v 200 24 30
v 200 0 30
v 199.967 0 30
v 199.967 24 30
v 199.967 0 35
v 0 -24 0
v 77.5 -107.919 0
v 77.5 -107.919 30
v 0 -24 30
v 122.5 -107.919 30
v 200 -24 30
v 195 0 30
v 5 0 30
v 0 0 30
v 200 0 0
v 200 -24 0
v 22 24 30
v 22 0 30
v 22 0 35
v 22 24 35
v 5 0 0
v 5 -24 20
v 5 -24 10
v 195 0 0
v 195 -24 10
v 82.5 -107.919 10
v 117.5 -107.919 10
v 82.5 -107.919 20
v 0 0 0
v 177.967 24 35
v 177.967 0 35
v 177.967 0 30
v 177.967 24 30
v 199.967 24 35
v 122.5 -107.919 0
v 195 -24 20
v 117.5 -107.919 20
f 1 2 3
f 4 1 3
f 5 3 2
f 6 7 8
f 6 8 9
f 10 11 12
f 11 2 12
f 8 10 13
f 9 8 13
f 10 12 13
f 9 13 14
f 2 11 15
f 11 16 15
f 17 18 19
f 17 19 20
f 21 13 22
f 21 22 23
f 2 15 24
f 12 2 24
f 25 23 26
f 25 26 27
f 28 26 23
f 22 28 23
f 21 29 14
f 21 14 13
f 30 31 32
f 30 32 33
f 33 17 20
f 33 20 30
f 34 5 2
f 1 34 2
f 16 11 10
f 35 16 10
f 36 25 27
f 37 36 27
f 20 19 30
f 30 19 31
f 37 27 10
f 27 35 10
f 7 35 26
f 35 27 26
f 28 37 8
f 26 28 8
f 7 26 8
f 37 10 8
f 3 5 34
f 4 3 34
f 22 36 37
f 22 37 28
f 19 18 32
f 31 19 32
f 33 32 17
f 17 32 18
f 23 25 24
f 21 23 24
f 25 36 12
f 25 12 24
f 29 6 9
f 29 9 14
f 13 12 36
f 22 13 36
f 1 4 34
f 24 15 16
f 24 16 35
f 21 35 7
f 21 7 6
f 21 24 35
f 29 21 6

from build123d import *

# Parameters (mm, degrees)
SKETCH1_W               = 200
SKETCH1_H               = 24
BOSS_EXTRUDE1_DEPTH     = 30
CUT_EXTRUDE1_DEPTH      = 204.656573672
CUT_EXTRUDE1_DEPTH_BACK = 195
SKETCH3_W               = 5
SKETCH3_H               = 30
BOSS_EXTRUDE2_DEPTH     = 24
BOSS_EXTRUDE3_DEPTH     = 24
SKETCH10_W              = 22
SKETCH10_H              = 24
CUT_EXTRUDE8_DEPTH      = 24
SKETCH12_W              = 22
SKETCH12_H              = 24
CUT_EXTRUDE9_DEPTH      = 24
BOSS_EXTRUDE4_DEPTH     = 30
CUT_EXTRUDE13_DEPTH     = 20
SKETCH16_W              = 190
SKETCH16_H              = 10
BOSS_EXTRUDE5_DEPTH     = 84
CUT_EXTRUDE15_DEPTH     = 84
CUT_EXTRUDE16_DEPTH     = 84
CUT_EXTRUDE17_DEPTH     = 84


with BuildPart() as part:
    # Sketch1 → Boss-Extrude1 (new body)
    with BuildSketch(Plane.XY):
        with Locations((100, -12)):
            Rectangle(SKETCH1_W, SKETCH1_H)
    extrude(amount=BOSS_EXTRUDE1_DEPTH)

    # Sketch2 → Cut-Extrude1 (cut, two sides: drawn at the far end of the back side and taken through both)
    with BuildSketch(Plane(origin=(200, 0, 0), x_dir=(0, 0, -1), z_dir=(1, 0, 0)).offset(-CUT_EXTRUDE1_DEPTH_BACK)):
        Polygon((0, 0), (-30, 0), (-20, -24), (-10, -24), align=None)
    extrude(amount=CUT_EXTRUDE1_DEPTH + CUT_EXTRUDE1_DEPTH_BACK, mode=Mode.SUBTRACT)

    # Sketch3 → Boss-Extrude2 (add)
    with BuildSketch(Plane(origin=(0, -24, 0), x_dir=(-1, 0, 0), z_dir=(0, -1, 0))):
        with Locations((-197.5, -15)):
            Rectangle(SKETCH3_W, SKETCH3_H)
    extrude(amount=-BOSS_EXTRUDE2_DEPTH)

    # Sketch13 → Boss-Extrude4 (add)
    with BuildSketch(Plane(origin=(0, 0, 0), x_dir=(-1, 0, 0), z_dir=(0, 0, -1))):
        Polygon((-200, -24), (-122.5, -107.919158747), (-77.5, -107.919158747), (0, -24), (-100, -24), align=None)
    extrude(amount=-BOSS_EXTRUDE4_DEPTH)

    # Sketch15 → Cut-Extrude13 (cut)
    with BuildSketch(Plane(origin=(0, 0, 0), x_dir=(-1, 0, 0), z_dir=(0, 0, -1))):
        Polygon((-5, -24), (-195, -24), (-117.5, -107.919158747), (-82.5, -107.919158747), align=None)
    extrude(amount=-CUT_EXTRUDE13_DEPTH, mode=Mode.SUBTRACT)

    # Sketch16 → Boss-Extrude5 (add)
    with BuildSketch(Plane.XZ.offset(24)):
        with Locations((100, 5)):
            Rectangle(SKETCH16_W, SKETCH16_H)
    extrude(amount=BOSS_EXTRUDE5_DEPTH)

    # Sketch17 → Cut-Extrude15 (cut)
    with BuildSketch(Plane.XY.offset(10)):
        Polygon((5, -29.414139274), (77.5, -107.919158747), (77.5, -132.289911092), (5, -132.289911092), (5, -108), align=None)
    extrude(amount=-CUT_EXTRUDE15_DEPTH, mode=Mode.SUBTRACT)

    # Sketch18 → Cut-Extrude16 (cut)
    with BuildSketch(Plane.XY.offset(10)):
        Polygon((195, -29.414139274), (122.5, -107.919158747), (122.856459542, -124.209438819), (195, -124.209438819), align=None)
    extrude(amount=-CUT_EXTRUDE16_DEPTH, mode=Mode.SUBTRACT)

    # Sketch19 → Cut-Extrude17 (cut)
    with BuildSketch(Plane.XY.offset(10)):
        Polygon((82.5, -107.919158747), (77.5, -107.919158747), (77.5, -108), (122.501768947, -108), (122.5, -107.919158747), (117.5, -107.919158747), align=None)
    extrude(amount=-CUT_EXTRUDE17_DEPTH, mode=Mode.SUBTRACT)


with BuildPart() as body_2:
    # Sketch5 → Boss-Extrude3 (new body)
    with BuildSketch(Plane(origin=(0, 0, 0), x_dir=(1, 0, 0), z_dir=(0, 1, 0))):
        Polygon((0, -30), (0, -35), (199.967386175, -35), (200, -30), align=None)
    extrude(amount=BOSS_EXTRUDE3_DEPTH)

    # Sketch10 → Cut-Extrude8 (cut)
    with BuildSketch(Plane.XY.offset(35)):
        with Locations((188.967386175, 12)):
            Rectangle(SKETCH10_W, SKETCH10_H)
    extrude(amount=-CUT_EXTRUDE8_DEPTH, mode=Mode.SUBTRACT)


with BuildPart() as cut_extrude8_piece_1:
    # of the separate pieces the step leaves, piece 1, a body of its own (cut_extrude8_pieces)
    add(body_2.part.solids().sort_by_distance((0, 0, 30))[0])

    # Sketch12 → Cut-Extrude9 (cut)
    with BuildSketch(Plane(origin=(0, 0, 30), x_dir=(-1, 0, 0), z_dir=(0, 0, -1))):
        with Locations((-11, 12)):
            Rectangle(SKETCH12_W, SKETCH12_H)
    extrude(amount=-CUT_EXTRUDE9_DEPTH, mode=Mode.SUBTRACT)


with BuildPart() as cut_extrude8_piece_2:
    # of the separate pieces the step leaves, piece 2, a body of its own (cut_extrude8_pieces)
    add(body_2.part.solids().sort_by_distance((200, 0, 30))[0])


solid = Compound([part.part, cut_extrude8_piece_1.part, cut_extrude8_piece_2.part])
